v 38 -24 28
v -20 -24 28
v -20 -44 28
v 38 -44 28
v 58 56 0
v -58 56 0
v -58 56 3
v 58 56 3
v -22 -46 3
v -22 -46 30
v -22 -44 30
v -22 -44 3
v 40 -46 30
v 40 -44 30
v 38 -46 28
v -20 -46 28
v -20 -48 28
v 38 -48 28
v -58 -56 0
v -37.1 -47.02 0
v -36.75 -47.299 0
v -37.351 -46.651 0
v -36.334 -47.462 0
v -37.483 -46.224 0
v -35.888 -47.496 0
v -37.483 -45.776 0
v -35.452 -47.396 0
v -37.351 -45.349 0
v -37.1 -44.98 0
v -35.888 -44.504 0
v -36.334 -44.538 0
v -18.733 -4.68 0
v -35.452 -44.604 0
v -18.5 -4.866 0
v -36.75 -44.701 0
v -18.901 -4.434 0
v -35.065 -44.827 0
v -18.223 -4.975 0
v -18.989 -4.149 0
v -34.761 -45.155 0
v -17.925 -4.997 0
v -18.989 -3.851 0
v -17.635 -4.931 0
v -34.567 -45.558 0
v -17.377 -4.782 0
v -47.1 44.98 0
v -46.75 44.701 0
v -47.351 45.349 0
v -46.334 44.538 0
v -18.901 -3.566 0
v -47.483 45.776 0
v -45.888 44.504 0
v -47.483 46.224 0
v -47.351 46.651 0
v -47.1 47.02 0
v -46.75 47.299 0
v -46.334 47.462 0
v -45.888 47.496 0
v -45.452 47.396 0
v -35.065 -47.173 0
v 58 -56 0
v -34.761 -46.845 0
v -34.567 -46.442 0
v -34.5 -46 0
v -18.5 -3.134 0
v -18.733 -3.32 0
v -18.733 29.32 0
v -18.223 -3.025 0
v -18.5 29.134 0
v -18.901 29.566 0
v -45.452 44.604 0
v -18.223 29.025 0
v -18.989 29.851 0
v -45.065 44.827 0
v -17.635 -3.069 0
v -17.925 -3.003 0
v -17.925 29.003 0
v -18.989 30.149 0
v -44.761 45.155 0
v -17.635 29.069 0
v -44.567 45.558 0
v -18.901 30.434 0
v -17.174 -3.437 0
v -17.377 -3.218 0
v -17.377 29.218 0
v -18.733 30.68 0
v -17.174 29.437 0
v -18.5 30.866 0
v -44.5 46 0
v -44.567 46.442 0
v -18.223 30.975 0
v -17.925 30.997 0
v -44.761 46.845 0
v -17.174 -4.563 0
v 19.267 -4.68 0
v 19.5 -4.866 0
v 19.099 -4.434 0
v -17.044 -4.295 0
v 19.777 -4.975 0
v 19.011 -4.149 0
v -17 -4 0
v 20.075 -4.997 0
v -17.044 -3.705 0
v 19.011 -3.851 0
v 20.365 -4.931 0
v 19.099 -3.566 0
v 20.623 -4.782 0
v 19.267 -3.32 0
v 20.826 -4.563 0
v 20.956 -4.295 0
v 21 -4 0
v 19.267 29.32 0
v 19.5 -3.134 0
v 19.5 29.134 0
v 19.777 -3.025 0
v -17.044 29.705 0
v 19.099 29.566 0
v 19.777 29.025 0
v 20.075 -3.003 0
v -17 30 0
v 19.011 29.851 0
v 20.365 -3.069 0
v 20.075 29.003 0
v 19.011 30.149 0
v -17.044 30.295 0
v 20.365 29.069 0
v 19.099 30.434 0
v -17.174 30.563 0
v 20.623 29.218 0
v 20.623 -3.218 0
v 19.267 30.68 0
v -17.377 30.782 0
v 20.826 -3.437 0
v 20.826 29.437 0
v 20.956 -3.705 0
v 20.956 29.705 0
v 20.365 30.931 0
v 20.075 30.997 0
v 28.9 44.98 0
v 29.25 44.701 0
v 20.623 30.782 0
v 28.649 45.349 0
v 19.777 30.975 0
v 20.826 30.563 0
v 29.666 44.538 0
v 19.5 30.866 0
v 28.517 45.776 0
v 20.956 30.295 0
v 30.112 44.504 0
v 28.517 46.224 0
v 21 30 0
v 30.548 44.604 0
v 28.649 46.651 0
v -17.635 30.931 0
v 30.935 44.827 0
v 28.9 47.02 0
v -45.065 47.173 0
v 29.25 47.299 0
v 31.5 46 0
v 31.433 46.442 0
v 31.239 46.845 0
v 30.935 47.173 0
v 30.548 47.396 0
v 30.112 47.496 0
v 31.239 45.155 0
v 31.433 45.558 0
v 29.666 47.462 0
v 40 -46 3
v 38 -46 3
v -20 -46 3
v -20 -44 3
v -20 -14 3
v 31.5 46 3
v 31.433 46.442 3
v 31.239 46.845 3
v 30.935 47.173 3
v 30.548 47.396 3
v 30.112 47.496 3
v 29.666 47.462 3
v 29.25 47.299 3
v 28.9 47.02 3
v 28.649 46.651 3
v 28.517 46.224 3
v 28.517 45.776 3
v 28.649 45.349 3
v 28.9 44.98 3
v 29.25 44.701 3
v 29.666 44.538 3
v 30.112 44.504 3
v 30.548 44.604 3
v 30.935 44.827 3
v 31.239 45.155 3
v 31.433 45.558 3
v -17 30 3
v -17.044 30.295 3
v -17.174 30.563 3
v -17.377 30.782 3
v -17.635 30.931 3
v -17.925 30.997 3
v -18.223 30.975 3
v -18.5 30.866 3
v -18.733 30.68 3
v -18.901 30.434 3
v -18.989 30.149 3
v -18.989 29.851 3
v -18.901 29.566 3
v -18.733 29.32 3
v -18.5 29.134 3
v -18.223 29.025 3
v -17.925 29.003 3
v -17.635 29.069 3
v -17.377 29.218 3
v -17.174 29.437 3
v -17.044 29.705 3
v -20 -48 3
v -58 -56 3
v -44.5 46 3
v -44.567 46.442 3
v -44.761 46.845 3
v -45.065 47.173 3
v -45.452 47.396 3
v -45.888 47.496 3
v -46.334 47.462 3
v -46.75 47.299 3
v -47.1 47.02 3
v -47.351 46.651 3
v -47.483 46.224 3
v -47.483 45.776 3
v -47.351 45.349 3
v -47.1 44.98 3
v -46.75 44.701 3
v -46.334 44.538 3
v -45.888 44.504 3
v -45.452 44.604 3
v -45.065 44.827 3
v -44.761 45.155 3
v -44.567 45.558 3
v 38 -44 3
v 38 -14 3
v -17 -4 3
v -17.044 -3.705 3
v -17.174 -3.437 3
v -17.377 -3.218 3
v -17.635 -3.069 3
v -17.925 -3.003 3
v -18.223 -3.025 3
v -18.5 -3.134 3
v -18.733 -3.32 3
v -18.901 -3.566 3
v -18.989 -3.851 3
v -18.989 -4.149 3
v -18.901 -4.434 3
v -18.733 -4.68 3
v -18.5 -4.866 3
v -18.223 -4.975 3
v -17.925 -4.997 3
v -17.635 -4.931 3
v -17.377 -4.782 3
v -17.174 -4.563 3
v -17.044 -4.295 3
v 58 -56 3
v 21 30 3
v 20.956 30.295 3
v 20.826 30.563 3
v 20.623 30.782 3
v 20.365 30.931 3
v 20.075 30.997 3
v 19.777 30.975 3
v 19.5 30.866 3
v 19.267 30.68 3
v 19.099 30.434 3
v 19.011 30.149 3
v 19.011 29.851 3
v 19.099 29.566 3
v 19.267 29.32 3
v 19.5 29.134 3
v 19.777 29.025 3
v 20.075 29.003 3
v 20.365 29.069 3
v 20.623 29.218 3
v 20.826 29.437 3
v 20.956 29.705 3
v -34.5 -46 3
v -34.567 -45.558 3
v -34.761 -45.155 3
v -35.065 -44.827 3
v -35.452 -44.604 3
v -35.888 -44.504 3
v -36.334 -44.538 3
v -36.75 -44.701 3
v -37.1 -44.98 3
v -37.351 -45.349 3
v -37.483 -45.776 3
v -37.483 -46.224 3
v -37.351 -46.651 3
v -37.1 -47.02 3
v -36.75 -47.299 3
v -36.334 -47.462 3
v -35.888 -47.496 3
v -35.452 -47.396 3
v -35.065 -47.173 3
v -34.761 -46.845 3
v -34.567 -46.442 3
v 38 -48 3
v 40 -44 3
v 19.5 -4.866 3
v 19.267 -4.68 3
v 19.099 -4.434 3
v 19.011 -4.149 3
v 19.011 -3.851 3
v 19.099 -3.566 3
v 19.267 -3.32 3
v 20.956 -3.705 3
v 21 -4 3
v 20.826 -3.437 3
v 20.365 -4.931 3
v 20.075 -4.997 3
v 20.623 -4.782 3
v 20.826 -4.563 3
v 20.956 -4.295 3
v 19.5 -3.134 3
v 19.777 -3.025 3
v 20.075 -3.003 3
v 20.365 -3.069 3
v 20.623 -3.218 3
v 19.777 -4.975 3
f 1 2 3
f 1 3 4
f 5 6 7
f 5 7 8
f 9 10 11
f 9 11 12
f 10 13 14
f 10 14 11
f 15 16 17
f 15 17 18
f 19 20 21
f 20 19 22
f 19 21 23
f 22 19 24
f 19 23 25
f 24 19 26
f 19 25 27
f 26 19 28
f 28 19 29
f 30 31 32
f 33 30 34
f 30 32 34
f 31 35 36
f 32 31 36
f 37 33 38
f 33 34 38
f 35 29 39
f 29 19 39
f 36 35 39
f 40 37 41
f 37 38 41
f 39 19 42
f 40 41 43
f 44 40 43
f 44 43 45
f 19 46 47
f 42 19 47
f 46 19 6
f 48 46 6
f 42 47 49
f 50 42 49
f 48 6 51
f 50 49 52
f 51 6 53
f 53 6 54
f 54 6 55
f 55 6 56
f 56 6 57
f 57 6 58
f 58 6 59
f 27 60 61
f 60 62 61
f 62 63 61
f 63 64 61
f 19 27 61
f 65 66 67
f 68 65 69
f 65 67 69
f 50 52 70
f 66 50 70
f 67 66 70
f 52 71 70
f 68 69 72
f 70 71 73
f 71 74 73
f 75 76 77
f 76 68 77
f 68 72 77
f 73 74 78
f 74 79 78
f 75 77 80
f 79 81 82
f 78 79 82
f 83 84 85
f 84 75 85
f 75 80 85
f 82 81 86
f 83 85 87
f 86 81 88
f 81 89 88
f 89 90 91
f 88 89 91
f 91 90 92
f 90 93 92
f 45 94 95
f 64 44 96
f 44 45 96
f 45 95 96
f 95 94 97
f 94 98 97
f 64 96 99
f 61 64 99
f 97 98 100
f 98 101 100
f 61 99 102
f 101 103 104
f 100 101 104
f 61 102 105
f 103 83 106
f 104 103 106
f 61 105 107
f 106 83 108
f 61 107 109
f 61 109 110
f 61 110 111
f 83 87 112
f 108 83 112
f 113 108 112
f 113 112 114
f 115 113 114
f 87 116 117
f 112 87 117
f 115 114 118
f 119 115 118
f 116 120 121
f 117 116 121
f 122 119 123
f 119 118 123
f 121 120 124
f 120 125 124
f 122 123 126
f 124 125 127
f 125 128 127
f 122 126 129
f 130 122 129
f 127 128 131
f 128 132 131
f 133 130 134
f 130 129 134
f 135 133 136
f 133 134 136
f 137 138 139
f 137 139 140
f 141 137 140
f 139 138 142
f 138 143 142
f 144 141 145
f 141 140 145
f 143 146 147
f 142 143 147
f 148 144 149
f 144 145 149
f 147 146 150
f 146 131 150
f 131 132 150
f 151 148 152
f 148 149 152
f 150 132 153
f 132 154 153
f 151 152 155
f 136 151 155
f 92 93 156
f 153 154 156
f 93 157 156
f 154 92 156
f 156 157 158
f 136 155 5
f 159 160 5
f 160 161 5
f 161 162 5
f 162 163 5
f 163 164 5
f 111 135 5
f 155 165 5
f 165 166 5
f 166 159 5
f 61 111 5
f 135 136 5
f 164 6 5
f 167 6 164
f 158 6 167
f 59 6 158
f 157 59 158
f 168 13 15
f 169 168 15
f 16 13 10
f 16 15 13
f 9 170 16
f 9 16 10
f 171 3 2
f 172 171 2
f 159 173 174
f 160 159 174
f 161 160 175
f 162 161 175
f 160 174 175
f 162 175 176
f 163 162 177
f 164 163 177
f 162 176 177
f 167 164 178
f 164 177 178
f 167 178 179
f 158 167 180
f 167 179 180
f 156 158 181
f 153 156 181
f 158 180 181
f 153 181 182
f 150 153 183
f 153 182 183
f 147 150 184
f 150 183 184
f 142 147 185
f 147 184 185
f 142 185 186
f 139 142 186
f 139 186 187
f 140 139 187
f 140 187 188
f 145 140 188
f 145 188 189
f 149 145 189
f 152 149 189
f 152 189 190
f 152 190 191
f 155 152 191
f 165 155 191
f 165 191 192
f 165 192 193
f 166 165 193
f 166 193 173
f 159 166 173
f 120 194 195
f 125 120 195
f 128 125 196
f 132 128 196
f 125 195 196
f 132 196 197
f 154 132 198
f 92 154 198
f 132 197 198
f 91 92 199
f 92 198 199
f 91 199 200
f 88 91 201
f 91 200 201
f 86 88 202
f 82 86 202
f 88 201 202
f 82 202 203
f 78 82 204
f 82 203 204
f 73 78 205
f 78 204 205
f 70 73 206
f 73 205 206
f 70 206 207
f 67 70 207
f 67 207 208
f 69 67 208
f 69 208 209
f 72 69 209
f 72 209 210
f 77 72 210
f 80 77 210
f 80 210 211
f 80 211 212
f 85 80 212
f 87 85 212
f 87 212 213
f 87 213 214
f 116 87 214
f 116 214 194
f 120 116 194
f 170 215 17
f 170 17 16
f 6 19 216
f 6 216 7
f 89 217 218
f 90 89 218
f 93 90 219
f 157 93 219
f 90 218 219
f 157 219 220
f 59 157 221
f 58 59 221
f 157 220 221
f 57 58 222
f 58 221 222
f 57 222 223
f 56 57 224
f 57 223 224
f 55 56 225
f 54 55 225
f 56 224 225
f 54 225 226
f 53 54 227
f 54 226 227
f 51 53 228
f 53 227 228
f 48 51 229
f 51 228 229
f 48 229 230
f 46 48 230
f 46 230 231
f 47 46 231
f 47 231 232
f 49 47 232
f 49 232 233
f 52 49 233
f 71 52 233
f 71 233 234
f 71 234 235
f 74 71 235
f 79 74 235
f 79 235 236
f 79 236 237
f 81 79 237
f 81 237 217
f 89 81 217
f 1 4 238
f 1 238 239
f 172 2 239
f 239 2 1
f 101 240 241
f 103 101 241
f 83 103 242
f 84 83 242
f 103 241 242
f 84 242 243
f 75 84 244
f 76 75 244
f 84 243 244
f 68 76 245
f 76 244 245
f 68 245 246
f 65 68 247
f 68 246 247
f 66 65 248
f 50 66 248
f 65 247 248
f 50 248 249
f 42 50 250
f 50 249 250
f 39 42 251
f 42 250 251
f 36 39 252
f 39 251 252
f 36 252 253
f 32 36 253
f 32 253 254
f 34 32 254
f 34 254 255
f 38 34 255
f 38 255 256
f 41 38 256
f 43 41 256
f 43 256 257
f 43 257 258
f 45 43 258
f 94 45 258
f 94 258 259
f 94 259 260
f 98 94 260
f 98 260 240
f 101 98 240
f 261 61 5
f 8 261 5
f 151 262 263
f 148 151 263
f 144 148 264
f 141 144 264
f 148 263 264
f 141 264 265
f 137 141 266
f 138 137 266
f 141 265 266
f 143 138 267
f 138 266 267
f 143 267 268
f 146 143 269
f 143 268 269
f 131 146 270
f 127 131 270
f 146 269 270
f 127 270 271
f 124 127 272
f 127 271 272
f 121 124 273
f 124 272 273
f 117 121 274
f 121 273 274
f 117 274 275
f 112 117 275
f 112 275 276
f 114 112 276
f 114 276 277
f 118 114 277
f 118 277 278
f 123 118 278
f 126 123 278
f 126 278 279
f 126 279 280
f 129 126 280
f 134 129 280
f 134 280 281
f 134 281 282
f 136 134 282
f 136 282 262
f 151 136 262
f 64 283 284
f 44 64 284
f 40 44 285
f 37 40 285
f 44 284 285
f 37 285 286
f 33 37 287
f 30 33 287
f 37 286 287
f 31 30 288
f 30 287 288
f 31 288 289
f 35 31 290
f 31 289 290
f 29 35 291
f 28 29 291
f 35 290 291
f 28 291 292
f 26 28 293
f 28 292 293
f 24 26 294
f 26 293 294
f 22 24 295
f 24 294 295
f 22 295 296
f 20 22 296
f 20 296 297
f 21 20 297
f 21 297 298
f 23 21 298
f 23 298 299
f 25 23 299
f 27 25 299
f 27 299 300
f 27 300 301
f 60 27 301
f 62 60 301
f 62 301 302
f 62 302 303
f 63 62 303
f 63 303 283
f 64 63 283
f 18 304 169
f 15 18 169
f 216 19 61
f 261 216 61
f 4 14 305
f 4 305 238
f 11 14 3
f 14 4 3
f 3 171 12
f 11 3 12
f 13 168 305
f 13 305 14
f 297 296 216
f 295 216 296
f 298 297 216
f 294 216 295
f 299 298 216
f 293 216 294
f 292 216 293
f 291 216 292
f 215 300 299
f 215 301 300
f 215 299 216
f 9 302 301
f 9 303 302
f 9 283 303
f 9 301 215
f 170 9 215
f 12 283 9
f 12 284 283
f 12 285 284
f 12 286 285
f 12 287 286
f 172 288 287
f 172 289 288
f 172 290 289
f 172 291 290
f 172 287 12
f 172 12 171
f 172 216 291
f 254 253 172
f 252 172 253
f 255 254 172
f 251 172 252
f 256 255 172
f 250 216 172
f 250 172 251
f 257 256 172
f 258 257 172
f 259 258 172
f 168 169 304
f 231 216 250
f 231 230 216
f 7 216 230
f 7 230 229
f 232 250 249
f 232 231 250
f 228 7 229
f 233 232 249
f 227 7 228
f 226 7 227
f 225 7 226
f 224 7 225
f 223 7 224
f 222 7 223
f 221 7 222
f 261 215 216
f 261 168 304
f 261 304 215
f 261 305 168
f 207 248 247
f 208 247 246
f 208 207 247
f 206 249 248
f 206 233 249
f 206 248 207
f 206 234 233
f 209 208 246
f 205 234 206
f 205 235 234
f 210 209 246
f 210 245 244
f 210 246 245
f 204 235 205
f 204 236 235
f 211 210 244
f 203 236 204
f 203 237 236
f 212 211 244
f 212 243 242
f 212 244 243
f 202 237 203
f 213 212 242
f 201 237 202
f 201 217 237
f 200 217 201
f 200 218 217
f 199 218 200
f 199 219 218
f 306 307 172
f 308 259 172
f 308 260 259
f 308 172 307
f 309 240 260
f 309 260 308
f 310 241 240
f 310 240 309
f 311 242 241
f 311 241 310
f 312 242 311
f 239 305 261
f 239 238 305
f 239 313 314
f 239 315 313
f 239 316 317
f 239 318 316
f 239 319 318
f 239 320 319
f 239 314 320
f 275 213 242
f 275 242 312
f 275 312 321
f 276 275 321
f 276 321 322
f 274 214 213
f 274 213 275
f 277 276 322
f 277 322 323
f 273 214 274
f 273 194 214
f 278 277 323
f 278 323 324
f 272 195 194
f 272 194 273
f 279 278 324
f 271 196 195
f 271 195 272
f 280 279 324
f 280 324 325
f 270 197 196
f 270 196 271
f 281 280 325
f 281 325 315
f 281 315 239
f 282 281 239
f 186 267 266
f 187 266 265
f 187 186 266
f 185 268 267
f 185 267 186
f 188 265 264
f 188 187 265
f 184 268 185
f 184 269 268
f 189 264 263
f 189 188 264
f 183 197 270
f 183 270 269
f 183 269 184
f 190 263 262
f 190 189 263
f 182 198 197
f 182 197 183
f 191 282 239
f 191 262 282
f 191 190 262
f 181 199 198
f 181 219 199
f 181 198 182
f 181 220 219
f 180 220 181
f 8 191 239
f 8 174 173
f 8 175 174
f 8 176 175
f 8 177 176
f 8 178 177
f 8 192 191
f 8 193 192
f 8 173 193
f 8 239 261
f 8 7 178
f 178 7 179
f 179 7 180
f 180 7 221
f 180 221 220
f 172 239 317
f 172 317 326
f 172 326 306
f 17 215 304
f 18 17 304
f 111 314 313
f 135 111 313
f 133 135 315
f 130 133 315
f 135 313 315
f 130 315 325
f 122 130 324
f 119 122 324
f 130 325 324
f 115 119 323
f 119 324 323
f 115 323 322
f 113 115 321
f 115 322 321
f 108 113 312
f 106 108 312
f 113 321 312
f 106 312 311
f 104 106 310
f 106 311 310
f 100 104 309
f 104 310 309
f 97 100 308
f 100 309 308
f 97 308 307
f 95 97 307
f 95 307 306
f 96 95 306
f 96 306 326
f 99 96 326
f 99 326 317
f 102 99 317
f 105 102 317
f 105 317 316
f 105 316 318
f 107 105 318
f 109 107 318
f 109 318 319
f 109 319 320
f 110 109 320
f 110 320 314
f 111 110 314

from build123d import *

# Parameters (mm, degrees)
SKETCH1_W           = 116
SKETCH1_H           = 112
BOSS_EXTRUDE1_DEPTH = 3
SKETCH2_W           = 58
SKETCH2_H           = 34
BOSS_EXTRUDE2_DEPTH = 25
CHAMFER1_SIZE2      = 10
CHAMFER1_SIZE       = 25
BOSS_EXTRUDE4_DEPTH = 2
CUT_EXTRUDE1_REACH  = 87.024
SKETCH5_R           = 1.5
CUT_EXTRUDE2_REACH  = 87.024
SKETCH6_R           = 1


with BuildPart() as part:
    # Sketch1 → Boss-Extrude1 (new body)
    with BuildSketch(Plane.XY):
        Rectangle(SKETCH1_W, SKETCH1_H)
    extrude(amount=BOSS_EXTRUDE1_DEPTH)

    # Sketch2 → Boss-Extrude2 (add)
    with BuildSketch(Plane.XY.offset(3)):
        with Locations((9, -31)):
            Rectangle(SKETCH2_W, SKETCH2_H)
    extrude(amount=BOSS_EXTRUDE2_DEPTH)

    # Chamfer1
    chamfer1_edges = [part.edges().sort_by_distance(p)[0] for p in [
        (9, -14, 28),
    ]]
    chamfer1_side = [part.faces().sort_by_distance(p)[0] for p in [
        (9, -14, 27.8),
    ]]
    chamfer(chamfer1_edges, length=CHAMFER1_SIZE - 0.0001, length2=CHAMFER1_SIZE2 - 0.0001, reference=chamfer1_side[0])  # a hair under: the kernel refuses the full size

    # Sketch4 → Boss-Extrude4 (add)
    with BuildSketch(Plane(origin=(0, -46, 0), x_dir=(-1, 0, 0), z_dir=(0, -1, 0))):
        Polygon((22, -3), (20, -3), (20, -28), (-38, -28), (-38, -3), (-40, -3), (-40, -30), (22, -30), align=None)
    extrude(amount=-BOSS_EXTRUDE4_DEPTH)

    # Sketch5 → Cut-Extrude1 (cut, up to next)
    with BuildSketch(Plane.XY.offset(3), mode=Mode.PRIVATE) as cut_extrude1_sk1:
        with Locations((-46, 46)):
            Circle(SKETCH5_R)
    cut_extrude1_tool1 = extrude(cut_extrude1_sk1.sketch, amount=-CUT_EXTRUDE1_REACH, mode=Mode.PRIVATE) & part.part
    # Sketch5 → Cut-Extrude1 (cut, up to next)
    with BuildSketch(Plane.XY.offset(3), mode=Mode.PRIVATE) as cut_extrude1_sk2:
        with Locations((30, 46)):
            Circle(SKETCH5_R)
    cut_extrude1_tool2 = extrude(cut_extrude1_sk2.sketch, amount=-CUT_EXTRUDE1_REACH, mode=Mode.PRIVATE) & part.part
    # Sketch5 → Cut-Extrude1 (cut, up to next)
    with BuildSketch(Plane.XY.offset(3), mode=Mode.PRIVATE) as cut_extrude1_sk3:
        with Locations((-36, -46)):
            Circle(SKETCH5_R)
    cut_extrude1_tool3 = extrude(cut_extrude1_sk3.sketch, amount=-CUT_EXTRUDE1_REACH, mode=Mode.PRIVATE) & part.part
    add(cut_extrude1_tool1.solids().sort_by_distance((-46, 46, 3))[0], mode=Mode.SUBTRACT)
    add(cut_extrude1_tool2.solids().sort_by_distance((30, 46, 3))[0], mode=Mode.SUBTRACT)
    add(cut_extrude1_tool3.solids().sort_by_distance((-36, -46, 3))[0], mode=Mode.SUBTRACT)

    # Sketch6 → Cut-Extrude2 (cut, up to next)
    with BuildSketch(Plane.XY.offset(3), mode=Mode.PRIVATE) as cut_extrude2_sk1:
        with Locations((-18, 30)):
            Circle(SKETCH6_R)
    cut_extrude2_tool1 = extrude(cut_extrude2_sk1.sketch, amount=-CUT_EXTRUDE2_REACH, mode=Mode.PRIVATE) & part.part
    # Sketch6 → Cut-Extrude2 (cut, up to next)
    with BuildSketch(Plane.XY.offset(3), mode=Mode.PRIVATE) as cut_extrude2_sk2:
        with Locations((20, 30)):
            Circle(SKETCH6_R)
    cut_extrude2_tool2 = extrude(cut_extrude2_sk2.sketch, amount=-CUT_EXTRUDE2_REACH, mode=Mode.PRIVATE) & part.part
    # Sketch6 → Cut-Extrude2 (cut, up to next)
    with BuildSketch(Plane.XY.offset(3), mode=Mode.PRIVATE) as cut_extrude2_sk3:
        with Locations((-18, -4)):
            Circle(SKETCH6_R)
    cut_extrude2_tool3 = extrude(cut_extrude2_sk3.sketch, amount=-CUT_EXTRUDE2_REACH, mode=Mode.PRIVATE) & part.part
    # Sketch6 → Cut-Extrude2 (cut, up to next)
    with BuildSketch(Plane.XY.offset(3), mode=Mode.PRIVATE) as cut_extrude2_sk4:
        with Locations((20, -4)):
            Circle(SKETCH6_R)
    cut_extrude2_tool4 = extrude(cut_extrude2_sk4.sketch, amount=-CUT_EXTRUDE2_REACH, mode=Mode.PRIVATE) & part.part
    add(cut_extrude2_tool1.solids().sort_by_distance((-18, 30, 3))[0], mode=Mode.SUBTRACT)
    add(cut_extrude2_tool2.solids().sort_by_distance((20, 30, 3))[0], mode=Mode.SUBTRACT)
    add(cut_extrude2_tool3.solids().sort_by_distance((-18, -4, 3))[0], mode=Mode.SUBTRACT)
    add(cut_extrude2_tool4.solids().sort_by_distance((20, -4, 3))[0], mode=Mode.SUBTRACT)


solid = part.part
